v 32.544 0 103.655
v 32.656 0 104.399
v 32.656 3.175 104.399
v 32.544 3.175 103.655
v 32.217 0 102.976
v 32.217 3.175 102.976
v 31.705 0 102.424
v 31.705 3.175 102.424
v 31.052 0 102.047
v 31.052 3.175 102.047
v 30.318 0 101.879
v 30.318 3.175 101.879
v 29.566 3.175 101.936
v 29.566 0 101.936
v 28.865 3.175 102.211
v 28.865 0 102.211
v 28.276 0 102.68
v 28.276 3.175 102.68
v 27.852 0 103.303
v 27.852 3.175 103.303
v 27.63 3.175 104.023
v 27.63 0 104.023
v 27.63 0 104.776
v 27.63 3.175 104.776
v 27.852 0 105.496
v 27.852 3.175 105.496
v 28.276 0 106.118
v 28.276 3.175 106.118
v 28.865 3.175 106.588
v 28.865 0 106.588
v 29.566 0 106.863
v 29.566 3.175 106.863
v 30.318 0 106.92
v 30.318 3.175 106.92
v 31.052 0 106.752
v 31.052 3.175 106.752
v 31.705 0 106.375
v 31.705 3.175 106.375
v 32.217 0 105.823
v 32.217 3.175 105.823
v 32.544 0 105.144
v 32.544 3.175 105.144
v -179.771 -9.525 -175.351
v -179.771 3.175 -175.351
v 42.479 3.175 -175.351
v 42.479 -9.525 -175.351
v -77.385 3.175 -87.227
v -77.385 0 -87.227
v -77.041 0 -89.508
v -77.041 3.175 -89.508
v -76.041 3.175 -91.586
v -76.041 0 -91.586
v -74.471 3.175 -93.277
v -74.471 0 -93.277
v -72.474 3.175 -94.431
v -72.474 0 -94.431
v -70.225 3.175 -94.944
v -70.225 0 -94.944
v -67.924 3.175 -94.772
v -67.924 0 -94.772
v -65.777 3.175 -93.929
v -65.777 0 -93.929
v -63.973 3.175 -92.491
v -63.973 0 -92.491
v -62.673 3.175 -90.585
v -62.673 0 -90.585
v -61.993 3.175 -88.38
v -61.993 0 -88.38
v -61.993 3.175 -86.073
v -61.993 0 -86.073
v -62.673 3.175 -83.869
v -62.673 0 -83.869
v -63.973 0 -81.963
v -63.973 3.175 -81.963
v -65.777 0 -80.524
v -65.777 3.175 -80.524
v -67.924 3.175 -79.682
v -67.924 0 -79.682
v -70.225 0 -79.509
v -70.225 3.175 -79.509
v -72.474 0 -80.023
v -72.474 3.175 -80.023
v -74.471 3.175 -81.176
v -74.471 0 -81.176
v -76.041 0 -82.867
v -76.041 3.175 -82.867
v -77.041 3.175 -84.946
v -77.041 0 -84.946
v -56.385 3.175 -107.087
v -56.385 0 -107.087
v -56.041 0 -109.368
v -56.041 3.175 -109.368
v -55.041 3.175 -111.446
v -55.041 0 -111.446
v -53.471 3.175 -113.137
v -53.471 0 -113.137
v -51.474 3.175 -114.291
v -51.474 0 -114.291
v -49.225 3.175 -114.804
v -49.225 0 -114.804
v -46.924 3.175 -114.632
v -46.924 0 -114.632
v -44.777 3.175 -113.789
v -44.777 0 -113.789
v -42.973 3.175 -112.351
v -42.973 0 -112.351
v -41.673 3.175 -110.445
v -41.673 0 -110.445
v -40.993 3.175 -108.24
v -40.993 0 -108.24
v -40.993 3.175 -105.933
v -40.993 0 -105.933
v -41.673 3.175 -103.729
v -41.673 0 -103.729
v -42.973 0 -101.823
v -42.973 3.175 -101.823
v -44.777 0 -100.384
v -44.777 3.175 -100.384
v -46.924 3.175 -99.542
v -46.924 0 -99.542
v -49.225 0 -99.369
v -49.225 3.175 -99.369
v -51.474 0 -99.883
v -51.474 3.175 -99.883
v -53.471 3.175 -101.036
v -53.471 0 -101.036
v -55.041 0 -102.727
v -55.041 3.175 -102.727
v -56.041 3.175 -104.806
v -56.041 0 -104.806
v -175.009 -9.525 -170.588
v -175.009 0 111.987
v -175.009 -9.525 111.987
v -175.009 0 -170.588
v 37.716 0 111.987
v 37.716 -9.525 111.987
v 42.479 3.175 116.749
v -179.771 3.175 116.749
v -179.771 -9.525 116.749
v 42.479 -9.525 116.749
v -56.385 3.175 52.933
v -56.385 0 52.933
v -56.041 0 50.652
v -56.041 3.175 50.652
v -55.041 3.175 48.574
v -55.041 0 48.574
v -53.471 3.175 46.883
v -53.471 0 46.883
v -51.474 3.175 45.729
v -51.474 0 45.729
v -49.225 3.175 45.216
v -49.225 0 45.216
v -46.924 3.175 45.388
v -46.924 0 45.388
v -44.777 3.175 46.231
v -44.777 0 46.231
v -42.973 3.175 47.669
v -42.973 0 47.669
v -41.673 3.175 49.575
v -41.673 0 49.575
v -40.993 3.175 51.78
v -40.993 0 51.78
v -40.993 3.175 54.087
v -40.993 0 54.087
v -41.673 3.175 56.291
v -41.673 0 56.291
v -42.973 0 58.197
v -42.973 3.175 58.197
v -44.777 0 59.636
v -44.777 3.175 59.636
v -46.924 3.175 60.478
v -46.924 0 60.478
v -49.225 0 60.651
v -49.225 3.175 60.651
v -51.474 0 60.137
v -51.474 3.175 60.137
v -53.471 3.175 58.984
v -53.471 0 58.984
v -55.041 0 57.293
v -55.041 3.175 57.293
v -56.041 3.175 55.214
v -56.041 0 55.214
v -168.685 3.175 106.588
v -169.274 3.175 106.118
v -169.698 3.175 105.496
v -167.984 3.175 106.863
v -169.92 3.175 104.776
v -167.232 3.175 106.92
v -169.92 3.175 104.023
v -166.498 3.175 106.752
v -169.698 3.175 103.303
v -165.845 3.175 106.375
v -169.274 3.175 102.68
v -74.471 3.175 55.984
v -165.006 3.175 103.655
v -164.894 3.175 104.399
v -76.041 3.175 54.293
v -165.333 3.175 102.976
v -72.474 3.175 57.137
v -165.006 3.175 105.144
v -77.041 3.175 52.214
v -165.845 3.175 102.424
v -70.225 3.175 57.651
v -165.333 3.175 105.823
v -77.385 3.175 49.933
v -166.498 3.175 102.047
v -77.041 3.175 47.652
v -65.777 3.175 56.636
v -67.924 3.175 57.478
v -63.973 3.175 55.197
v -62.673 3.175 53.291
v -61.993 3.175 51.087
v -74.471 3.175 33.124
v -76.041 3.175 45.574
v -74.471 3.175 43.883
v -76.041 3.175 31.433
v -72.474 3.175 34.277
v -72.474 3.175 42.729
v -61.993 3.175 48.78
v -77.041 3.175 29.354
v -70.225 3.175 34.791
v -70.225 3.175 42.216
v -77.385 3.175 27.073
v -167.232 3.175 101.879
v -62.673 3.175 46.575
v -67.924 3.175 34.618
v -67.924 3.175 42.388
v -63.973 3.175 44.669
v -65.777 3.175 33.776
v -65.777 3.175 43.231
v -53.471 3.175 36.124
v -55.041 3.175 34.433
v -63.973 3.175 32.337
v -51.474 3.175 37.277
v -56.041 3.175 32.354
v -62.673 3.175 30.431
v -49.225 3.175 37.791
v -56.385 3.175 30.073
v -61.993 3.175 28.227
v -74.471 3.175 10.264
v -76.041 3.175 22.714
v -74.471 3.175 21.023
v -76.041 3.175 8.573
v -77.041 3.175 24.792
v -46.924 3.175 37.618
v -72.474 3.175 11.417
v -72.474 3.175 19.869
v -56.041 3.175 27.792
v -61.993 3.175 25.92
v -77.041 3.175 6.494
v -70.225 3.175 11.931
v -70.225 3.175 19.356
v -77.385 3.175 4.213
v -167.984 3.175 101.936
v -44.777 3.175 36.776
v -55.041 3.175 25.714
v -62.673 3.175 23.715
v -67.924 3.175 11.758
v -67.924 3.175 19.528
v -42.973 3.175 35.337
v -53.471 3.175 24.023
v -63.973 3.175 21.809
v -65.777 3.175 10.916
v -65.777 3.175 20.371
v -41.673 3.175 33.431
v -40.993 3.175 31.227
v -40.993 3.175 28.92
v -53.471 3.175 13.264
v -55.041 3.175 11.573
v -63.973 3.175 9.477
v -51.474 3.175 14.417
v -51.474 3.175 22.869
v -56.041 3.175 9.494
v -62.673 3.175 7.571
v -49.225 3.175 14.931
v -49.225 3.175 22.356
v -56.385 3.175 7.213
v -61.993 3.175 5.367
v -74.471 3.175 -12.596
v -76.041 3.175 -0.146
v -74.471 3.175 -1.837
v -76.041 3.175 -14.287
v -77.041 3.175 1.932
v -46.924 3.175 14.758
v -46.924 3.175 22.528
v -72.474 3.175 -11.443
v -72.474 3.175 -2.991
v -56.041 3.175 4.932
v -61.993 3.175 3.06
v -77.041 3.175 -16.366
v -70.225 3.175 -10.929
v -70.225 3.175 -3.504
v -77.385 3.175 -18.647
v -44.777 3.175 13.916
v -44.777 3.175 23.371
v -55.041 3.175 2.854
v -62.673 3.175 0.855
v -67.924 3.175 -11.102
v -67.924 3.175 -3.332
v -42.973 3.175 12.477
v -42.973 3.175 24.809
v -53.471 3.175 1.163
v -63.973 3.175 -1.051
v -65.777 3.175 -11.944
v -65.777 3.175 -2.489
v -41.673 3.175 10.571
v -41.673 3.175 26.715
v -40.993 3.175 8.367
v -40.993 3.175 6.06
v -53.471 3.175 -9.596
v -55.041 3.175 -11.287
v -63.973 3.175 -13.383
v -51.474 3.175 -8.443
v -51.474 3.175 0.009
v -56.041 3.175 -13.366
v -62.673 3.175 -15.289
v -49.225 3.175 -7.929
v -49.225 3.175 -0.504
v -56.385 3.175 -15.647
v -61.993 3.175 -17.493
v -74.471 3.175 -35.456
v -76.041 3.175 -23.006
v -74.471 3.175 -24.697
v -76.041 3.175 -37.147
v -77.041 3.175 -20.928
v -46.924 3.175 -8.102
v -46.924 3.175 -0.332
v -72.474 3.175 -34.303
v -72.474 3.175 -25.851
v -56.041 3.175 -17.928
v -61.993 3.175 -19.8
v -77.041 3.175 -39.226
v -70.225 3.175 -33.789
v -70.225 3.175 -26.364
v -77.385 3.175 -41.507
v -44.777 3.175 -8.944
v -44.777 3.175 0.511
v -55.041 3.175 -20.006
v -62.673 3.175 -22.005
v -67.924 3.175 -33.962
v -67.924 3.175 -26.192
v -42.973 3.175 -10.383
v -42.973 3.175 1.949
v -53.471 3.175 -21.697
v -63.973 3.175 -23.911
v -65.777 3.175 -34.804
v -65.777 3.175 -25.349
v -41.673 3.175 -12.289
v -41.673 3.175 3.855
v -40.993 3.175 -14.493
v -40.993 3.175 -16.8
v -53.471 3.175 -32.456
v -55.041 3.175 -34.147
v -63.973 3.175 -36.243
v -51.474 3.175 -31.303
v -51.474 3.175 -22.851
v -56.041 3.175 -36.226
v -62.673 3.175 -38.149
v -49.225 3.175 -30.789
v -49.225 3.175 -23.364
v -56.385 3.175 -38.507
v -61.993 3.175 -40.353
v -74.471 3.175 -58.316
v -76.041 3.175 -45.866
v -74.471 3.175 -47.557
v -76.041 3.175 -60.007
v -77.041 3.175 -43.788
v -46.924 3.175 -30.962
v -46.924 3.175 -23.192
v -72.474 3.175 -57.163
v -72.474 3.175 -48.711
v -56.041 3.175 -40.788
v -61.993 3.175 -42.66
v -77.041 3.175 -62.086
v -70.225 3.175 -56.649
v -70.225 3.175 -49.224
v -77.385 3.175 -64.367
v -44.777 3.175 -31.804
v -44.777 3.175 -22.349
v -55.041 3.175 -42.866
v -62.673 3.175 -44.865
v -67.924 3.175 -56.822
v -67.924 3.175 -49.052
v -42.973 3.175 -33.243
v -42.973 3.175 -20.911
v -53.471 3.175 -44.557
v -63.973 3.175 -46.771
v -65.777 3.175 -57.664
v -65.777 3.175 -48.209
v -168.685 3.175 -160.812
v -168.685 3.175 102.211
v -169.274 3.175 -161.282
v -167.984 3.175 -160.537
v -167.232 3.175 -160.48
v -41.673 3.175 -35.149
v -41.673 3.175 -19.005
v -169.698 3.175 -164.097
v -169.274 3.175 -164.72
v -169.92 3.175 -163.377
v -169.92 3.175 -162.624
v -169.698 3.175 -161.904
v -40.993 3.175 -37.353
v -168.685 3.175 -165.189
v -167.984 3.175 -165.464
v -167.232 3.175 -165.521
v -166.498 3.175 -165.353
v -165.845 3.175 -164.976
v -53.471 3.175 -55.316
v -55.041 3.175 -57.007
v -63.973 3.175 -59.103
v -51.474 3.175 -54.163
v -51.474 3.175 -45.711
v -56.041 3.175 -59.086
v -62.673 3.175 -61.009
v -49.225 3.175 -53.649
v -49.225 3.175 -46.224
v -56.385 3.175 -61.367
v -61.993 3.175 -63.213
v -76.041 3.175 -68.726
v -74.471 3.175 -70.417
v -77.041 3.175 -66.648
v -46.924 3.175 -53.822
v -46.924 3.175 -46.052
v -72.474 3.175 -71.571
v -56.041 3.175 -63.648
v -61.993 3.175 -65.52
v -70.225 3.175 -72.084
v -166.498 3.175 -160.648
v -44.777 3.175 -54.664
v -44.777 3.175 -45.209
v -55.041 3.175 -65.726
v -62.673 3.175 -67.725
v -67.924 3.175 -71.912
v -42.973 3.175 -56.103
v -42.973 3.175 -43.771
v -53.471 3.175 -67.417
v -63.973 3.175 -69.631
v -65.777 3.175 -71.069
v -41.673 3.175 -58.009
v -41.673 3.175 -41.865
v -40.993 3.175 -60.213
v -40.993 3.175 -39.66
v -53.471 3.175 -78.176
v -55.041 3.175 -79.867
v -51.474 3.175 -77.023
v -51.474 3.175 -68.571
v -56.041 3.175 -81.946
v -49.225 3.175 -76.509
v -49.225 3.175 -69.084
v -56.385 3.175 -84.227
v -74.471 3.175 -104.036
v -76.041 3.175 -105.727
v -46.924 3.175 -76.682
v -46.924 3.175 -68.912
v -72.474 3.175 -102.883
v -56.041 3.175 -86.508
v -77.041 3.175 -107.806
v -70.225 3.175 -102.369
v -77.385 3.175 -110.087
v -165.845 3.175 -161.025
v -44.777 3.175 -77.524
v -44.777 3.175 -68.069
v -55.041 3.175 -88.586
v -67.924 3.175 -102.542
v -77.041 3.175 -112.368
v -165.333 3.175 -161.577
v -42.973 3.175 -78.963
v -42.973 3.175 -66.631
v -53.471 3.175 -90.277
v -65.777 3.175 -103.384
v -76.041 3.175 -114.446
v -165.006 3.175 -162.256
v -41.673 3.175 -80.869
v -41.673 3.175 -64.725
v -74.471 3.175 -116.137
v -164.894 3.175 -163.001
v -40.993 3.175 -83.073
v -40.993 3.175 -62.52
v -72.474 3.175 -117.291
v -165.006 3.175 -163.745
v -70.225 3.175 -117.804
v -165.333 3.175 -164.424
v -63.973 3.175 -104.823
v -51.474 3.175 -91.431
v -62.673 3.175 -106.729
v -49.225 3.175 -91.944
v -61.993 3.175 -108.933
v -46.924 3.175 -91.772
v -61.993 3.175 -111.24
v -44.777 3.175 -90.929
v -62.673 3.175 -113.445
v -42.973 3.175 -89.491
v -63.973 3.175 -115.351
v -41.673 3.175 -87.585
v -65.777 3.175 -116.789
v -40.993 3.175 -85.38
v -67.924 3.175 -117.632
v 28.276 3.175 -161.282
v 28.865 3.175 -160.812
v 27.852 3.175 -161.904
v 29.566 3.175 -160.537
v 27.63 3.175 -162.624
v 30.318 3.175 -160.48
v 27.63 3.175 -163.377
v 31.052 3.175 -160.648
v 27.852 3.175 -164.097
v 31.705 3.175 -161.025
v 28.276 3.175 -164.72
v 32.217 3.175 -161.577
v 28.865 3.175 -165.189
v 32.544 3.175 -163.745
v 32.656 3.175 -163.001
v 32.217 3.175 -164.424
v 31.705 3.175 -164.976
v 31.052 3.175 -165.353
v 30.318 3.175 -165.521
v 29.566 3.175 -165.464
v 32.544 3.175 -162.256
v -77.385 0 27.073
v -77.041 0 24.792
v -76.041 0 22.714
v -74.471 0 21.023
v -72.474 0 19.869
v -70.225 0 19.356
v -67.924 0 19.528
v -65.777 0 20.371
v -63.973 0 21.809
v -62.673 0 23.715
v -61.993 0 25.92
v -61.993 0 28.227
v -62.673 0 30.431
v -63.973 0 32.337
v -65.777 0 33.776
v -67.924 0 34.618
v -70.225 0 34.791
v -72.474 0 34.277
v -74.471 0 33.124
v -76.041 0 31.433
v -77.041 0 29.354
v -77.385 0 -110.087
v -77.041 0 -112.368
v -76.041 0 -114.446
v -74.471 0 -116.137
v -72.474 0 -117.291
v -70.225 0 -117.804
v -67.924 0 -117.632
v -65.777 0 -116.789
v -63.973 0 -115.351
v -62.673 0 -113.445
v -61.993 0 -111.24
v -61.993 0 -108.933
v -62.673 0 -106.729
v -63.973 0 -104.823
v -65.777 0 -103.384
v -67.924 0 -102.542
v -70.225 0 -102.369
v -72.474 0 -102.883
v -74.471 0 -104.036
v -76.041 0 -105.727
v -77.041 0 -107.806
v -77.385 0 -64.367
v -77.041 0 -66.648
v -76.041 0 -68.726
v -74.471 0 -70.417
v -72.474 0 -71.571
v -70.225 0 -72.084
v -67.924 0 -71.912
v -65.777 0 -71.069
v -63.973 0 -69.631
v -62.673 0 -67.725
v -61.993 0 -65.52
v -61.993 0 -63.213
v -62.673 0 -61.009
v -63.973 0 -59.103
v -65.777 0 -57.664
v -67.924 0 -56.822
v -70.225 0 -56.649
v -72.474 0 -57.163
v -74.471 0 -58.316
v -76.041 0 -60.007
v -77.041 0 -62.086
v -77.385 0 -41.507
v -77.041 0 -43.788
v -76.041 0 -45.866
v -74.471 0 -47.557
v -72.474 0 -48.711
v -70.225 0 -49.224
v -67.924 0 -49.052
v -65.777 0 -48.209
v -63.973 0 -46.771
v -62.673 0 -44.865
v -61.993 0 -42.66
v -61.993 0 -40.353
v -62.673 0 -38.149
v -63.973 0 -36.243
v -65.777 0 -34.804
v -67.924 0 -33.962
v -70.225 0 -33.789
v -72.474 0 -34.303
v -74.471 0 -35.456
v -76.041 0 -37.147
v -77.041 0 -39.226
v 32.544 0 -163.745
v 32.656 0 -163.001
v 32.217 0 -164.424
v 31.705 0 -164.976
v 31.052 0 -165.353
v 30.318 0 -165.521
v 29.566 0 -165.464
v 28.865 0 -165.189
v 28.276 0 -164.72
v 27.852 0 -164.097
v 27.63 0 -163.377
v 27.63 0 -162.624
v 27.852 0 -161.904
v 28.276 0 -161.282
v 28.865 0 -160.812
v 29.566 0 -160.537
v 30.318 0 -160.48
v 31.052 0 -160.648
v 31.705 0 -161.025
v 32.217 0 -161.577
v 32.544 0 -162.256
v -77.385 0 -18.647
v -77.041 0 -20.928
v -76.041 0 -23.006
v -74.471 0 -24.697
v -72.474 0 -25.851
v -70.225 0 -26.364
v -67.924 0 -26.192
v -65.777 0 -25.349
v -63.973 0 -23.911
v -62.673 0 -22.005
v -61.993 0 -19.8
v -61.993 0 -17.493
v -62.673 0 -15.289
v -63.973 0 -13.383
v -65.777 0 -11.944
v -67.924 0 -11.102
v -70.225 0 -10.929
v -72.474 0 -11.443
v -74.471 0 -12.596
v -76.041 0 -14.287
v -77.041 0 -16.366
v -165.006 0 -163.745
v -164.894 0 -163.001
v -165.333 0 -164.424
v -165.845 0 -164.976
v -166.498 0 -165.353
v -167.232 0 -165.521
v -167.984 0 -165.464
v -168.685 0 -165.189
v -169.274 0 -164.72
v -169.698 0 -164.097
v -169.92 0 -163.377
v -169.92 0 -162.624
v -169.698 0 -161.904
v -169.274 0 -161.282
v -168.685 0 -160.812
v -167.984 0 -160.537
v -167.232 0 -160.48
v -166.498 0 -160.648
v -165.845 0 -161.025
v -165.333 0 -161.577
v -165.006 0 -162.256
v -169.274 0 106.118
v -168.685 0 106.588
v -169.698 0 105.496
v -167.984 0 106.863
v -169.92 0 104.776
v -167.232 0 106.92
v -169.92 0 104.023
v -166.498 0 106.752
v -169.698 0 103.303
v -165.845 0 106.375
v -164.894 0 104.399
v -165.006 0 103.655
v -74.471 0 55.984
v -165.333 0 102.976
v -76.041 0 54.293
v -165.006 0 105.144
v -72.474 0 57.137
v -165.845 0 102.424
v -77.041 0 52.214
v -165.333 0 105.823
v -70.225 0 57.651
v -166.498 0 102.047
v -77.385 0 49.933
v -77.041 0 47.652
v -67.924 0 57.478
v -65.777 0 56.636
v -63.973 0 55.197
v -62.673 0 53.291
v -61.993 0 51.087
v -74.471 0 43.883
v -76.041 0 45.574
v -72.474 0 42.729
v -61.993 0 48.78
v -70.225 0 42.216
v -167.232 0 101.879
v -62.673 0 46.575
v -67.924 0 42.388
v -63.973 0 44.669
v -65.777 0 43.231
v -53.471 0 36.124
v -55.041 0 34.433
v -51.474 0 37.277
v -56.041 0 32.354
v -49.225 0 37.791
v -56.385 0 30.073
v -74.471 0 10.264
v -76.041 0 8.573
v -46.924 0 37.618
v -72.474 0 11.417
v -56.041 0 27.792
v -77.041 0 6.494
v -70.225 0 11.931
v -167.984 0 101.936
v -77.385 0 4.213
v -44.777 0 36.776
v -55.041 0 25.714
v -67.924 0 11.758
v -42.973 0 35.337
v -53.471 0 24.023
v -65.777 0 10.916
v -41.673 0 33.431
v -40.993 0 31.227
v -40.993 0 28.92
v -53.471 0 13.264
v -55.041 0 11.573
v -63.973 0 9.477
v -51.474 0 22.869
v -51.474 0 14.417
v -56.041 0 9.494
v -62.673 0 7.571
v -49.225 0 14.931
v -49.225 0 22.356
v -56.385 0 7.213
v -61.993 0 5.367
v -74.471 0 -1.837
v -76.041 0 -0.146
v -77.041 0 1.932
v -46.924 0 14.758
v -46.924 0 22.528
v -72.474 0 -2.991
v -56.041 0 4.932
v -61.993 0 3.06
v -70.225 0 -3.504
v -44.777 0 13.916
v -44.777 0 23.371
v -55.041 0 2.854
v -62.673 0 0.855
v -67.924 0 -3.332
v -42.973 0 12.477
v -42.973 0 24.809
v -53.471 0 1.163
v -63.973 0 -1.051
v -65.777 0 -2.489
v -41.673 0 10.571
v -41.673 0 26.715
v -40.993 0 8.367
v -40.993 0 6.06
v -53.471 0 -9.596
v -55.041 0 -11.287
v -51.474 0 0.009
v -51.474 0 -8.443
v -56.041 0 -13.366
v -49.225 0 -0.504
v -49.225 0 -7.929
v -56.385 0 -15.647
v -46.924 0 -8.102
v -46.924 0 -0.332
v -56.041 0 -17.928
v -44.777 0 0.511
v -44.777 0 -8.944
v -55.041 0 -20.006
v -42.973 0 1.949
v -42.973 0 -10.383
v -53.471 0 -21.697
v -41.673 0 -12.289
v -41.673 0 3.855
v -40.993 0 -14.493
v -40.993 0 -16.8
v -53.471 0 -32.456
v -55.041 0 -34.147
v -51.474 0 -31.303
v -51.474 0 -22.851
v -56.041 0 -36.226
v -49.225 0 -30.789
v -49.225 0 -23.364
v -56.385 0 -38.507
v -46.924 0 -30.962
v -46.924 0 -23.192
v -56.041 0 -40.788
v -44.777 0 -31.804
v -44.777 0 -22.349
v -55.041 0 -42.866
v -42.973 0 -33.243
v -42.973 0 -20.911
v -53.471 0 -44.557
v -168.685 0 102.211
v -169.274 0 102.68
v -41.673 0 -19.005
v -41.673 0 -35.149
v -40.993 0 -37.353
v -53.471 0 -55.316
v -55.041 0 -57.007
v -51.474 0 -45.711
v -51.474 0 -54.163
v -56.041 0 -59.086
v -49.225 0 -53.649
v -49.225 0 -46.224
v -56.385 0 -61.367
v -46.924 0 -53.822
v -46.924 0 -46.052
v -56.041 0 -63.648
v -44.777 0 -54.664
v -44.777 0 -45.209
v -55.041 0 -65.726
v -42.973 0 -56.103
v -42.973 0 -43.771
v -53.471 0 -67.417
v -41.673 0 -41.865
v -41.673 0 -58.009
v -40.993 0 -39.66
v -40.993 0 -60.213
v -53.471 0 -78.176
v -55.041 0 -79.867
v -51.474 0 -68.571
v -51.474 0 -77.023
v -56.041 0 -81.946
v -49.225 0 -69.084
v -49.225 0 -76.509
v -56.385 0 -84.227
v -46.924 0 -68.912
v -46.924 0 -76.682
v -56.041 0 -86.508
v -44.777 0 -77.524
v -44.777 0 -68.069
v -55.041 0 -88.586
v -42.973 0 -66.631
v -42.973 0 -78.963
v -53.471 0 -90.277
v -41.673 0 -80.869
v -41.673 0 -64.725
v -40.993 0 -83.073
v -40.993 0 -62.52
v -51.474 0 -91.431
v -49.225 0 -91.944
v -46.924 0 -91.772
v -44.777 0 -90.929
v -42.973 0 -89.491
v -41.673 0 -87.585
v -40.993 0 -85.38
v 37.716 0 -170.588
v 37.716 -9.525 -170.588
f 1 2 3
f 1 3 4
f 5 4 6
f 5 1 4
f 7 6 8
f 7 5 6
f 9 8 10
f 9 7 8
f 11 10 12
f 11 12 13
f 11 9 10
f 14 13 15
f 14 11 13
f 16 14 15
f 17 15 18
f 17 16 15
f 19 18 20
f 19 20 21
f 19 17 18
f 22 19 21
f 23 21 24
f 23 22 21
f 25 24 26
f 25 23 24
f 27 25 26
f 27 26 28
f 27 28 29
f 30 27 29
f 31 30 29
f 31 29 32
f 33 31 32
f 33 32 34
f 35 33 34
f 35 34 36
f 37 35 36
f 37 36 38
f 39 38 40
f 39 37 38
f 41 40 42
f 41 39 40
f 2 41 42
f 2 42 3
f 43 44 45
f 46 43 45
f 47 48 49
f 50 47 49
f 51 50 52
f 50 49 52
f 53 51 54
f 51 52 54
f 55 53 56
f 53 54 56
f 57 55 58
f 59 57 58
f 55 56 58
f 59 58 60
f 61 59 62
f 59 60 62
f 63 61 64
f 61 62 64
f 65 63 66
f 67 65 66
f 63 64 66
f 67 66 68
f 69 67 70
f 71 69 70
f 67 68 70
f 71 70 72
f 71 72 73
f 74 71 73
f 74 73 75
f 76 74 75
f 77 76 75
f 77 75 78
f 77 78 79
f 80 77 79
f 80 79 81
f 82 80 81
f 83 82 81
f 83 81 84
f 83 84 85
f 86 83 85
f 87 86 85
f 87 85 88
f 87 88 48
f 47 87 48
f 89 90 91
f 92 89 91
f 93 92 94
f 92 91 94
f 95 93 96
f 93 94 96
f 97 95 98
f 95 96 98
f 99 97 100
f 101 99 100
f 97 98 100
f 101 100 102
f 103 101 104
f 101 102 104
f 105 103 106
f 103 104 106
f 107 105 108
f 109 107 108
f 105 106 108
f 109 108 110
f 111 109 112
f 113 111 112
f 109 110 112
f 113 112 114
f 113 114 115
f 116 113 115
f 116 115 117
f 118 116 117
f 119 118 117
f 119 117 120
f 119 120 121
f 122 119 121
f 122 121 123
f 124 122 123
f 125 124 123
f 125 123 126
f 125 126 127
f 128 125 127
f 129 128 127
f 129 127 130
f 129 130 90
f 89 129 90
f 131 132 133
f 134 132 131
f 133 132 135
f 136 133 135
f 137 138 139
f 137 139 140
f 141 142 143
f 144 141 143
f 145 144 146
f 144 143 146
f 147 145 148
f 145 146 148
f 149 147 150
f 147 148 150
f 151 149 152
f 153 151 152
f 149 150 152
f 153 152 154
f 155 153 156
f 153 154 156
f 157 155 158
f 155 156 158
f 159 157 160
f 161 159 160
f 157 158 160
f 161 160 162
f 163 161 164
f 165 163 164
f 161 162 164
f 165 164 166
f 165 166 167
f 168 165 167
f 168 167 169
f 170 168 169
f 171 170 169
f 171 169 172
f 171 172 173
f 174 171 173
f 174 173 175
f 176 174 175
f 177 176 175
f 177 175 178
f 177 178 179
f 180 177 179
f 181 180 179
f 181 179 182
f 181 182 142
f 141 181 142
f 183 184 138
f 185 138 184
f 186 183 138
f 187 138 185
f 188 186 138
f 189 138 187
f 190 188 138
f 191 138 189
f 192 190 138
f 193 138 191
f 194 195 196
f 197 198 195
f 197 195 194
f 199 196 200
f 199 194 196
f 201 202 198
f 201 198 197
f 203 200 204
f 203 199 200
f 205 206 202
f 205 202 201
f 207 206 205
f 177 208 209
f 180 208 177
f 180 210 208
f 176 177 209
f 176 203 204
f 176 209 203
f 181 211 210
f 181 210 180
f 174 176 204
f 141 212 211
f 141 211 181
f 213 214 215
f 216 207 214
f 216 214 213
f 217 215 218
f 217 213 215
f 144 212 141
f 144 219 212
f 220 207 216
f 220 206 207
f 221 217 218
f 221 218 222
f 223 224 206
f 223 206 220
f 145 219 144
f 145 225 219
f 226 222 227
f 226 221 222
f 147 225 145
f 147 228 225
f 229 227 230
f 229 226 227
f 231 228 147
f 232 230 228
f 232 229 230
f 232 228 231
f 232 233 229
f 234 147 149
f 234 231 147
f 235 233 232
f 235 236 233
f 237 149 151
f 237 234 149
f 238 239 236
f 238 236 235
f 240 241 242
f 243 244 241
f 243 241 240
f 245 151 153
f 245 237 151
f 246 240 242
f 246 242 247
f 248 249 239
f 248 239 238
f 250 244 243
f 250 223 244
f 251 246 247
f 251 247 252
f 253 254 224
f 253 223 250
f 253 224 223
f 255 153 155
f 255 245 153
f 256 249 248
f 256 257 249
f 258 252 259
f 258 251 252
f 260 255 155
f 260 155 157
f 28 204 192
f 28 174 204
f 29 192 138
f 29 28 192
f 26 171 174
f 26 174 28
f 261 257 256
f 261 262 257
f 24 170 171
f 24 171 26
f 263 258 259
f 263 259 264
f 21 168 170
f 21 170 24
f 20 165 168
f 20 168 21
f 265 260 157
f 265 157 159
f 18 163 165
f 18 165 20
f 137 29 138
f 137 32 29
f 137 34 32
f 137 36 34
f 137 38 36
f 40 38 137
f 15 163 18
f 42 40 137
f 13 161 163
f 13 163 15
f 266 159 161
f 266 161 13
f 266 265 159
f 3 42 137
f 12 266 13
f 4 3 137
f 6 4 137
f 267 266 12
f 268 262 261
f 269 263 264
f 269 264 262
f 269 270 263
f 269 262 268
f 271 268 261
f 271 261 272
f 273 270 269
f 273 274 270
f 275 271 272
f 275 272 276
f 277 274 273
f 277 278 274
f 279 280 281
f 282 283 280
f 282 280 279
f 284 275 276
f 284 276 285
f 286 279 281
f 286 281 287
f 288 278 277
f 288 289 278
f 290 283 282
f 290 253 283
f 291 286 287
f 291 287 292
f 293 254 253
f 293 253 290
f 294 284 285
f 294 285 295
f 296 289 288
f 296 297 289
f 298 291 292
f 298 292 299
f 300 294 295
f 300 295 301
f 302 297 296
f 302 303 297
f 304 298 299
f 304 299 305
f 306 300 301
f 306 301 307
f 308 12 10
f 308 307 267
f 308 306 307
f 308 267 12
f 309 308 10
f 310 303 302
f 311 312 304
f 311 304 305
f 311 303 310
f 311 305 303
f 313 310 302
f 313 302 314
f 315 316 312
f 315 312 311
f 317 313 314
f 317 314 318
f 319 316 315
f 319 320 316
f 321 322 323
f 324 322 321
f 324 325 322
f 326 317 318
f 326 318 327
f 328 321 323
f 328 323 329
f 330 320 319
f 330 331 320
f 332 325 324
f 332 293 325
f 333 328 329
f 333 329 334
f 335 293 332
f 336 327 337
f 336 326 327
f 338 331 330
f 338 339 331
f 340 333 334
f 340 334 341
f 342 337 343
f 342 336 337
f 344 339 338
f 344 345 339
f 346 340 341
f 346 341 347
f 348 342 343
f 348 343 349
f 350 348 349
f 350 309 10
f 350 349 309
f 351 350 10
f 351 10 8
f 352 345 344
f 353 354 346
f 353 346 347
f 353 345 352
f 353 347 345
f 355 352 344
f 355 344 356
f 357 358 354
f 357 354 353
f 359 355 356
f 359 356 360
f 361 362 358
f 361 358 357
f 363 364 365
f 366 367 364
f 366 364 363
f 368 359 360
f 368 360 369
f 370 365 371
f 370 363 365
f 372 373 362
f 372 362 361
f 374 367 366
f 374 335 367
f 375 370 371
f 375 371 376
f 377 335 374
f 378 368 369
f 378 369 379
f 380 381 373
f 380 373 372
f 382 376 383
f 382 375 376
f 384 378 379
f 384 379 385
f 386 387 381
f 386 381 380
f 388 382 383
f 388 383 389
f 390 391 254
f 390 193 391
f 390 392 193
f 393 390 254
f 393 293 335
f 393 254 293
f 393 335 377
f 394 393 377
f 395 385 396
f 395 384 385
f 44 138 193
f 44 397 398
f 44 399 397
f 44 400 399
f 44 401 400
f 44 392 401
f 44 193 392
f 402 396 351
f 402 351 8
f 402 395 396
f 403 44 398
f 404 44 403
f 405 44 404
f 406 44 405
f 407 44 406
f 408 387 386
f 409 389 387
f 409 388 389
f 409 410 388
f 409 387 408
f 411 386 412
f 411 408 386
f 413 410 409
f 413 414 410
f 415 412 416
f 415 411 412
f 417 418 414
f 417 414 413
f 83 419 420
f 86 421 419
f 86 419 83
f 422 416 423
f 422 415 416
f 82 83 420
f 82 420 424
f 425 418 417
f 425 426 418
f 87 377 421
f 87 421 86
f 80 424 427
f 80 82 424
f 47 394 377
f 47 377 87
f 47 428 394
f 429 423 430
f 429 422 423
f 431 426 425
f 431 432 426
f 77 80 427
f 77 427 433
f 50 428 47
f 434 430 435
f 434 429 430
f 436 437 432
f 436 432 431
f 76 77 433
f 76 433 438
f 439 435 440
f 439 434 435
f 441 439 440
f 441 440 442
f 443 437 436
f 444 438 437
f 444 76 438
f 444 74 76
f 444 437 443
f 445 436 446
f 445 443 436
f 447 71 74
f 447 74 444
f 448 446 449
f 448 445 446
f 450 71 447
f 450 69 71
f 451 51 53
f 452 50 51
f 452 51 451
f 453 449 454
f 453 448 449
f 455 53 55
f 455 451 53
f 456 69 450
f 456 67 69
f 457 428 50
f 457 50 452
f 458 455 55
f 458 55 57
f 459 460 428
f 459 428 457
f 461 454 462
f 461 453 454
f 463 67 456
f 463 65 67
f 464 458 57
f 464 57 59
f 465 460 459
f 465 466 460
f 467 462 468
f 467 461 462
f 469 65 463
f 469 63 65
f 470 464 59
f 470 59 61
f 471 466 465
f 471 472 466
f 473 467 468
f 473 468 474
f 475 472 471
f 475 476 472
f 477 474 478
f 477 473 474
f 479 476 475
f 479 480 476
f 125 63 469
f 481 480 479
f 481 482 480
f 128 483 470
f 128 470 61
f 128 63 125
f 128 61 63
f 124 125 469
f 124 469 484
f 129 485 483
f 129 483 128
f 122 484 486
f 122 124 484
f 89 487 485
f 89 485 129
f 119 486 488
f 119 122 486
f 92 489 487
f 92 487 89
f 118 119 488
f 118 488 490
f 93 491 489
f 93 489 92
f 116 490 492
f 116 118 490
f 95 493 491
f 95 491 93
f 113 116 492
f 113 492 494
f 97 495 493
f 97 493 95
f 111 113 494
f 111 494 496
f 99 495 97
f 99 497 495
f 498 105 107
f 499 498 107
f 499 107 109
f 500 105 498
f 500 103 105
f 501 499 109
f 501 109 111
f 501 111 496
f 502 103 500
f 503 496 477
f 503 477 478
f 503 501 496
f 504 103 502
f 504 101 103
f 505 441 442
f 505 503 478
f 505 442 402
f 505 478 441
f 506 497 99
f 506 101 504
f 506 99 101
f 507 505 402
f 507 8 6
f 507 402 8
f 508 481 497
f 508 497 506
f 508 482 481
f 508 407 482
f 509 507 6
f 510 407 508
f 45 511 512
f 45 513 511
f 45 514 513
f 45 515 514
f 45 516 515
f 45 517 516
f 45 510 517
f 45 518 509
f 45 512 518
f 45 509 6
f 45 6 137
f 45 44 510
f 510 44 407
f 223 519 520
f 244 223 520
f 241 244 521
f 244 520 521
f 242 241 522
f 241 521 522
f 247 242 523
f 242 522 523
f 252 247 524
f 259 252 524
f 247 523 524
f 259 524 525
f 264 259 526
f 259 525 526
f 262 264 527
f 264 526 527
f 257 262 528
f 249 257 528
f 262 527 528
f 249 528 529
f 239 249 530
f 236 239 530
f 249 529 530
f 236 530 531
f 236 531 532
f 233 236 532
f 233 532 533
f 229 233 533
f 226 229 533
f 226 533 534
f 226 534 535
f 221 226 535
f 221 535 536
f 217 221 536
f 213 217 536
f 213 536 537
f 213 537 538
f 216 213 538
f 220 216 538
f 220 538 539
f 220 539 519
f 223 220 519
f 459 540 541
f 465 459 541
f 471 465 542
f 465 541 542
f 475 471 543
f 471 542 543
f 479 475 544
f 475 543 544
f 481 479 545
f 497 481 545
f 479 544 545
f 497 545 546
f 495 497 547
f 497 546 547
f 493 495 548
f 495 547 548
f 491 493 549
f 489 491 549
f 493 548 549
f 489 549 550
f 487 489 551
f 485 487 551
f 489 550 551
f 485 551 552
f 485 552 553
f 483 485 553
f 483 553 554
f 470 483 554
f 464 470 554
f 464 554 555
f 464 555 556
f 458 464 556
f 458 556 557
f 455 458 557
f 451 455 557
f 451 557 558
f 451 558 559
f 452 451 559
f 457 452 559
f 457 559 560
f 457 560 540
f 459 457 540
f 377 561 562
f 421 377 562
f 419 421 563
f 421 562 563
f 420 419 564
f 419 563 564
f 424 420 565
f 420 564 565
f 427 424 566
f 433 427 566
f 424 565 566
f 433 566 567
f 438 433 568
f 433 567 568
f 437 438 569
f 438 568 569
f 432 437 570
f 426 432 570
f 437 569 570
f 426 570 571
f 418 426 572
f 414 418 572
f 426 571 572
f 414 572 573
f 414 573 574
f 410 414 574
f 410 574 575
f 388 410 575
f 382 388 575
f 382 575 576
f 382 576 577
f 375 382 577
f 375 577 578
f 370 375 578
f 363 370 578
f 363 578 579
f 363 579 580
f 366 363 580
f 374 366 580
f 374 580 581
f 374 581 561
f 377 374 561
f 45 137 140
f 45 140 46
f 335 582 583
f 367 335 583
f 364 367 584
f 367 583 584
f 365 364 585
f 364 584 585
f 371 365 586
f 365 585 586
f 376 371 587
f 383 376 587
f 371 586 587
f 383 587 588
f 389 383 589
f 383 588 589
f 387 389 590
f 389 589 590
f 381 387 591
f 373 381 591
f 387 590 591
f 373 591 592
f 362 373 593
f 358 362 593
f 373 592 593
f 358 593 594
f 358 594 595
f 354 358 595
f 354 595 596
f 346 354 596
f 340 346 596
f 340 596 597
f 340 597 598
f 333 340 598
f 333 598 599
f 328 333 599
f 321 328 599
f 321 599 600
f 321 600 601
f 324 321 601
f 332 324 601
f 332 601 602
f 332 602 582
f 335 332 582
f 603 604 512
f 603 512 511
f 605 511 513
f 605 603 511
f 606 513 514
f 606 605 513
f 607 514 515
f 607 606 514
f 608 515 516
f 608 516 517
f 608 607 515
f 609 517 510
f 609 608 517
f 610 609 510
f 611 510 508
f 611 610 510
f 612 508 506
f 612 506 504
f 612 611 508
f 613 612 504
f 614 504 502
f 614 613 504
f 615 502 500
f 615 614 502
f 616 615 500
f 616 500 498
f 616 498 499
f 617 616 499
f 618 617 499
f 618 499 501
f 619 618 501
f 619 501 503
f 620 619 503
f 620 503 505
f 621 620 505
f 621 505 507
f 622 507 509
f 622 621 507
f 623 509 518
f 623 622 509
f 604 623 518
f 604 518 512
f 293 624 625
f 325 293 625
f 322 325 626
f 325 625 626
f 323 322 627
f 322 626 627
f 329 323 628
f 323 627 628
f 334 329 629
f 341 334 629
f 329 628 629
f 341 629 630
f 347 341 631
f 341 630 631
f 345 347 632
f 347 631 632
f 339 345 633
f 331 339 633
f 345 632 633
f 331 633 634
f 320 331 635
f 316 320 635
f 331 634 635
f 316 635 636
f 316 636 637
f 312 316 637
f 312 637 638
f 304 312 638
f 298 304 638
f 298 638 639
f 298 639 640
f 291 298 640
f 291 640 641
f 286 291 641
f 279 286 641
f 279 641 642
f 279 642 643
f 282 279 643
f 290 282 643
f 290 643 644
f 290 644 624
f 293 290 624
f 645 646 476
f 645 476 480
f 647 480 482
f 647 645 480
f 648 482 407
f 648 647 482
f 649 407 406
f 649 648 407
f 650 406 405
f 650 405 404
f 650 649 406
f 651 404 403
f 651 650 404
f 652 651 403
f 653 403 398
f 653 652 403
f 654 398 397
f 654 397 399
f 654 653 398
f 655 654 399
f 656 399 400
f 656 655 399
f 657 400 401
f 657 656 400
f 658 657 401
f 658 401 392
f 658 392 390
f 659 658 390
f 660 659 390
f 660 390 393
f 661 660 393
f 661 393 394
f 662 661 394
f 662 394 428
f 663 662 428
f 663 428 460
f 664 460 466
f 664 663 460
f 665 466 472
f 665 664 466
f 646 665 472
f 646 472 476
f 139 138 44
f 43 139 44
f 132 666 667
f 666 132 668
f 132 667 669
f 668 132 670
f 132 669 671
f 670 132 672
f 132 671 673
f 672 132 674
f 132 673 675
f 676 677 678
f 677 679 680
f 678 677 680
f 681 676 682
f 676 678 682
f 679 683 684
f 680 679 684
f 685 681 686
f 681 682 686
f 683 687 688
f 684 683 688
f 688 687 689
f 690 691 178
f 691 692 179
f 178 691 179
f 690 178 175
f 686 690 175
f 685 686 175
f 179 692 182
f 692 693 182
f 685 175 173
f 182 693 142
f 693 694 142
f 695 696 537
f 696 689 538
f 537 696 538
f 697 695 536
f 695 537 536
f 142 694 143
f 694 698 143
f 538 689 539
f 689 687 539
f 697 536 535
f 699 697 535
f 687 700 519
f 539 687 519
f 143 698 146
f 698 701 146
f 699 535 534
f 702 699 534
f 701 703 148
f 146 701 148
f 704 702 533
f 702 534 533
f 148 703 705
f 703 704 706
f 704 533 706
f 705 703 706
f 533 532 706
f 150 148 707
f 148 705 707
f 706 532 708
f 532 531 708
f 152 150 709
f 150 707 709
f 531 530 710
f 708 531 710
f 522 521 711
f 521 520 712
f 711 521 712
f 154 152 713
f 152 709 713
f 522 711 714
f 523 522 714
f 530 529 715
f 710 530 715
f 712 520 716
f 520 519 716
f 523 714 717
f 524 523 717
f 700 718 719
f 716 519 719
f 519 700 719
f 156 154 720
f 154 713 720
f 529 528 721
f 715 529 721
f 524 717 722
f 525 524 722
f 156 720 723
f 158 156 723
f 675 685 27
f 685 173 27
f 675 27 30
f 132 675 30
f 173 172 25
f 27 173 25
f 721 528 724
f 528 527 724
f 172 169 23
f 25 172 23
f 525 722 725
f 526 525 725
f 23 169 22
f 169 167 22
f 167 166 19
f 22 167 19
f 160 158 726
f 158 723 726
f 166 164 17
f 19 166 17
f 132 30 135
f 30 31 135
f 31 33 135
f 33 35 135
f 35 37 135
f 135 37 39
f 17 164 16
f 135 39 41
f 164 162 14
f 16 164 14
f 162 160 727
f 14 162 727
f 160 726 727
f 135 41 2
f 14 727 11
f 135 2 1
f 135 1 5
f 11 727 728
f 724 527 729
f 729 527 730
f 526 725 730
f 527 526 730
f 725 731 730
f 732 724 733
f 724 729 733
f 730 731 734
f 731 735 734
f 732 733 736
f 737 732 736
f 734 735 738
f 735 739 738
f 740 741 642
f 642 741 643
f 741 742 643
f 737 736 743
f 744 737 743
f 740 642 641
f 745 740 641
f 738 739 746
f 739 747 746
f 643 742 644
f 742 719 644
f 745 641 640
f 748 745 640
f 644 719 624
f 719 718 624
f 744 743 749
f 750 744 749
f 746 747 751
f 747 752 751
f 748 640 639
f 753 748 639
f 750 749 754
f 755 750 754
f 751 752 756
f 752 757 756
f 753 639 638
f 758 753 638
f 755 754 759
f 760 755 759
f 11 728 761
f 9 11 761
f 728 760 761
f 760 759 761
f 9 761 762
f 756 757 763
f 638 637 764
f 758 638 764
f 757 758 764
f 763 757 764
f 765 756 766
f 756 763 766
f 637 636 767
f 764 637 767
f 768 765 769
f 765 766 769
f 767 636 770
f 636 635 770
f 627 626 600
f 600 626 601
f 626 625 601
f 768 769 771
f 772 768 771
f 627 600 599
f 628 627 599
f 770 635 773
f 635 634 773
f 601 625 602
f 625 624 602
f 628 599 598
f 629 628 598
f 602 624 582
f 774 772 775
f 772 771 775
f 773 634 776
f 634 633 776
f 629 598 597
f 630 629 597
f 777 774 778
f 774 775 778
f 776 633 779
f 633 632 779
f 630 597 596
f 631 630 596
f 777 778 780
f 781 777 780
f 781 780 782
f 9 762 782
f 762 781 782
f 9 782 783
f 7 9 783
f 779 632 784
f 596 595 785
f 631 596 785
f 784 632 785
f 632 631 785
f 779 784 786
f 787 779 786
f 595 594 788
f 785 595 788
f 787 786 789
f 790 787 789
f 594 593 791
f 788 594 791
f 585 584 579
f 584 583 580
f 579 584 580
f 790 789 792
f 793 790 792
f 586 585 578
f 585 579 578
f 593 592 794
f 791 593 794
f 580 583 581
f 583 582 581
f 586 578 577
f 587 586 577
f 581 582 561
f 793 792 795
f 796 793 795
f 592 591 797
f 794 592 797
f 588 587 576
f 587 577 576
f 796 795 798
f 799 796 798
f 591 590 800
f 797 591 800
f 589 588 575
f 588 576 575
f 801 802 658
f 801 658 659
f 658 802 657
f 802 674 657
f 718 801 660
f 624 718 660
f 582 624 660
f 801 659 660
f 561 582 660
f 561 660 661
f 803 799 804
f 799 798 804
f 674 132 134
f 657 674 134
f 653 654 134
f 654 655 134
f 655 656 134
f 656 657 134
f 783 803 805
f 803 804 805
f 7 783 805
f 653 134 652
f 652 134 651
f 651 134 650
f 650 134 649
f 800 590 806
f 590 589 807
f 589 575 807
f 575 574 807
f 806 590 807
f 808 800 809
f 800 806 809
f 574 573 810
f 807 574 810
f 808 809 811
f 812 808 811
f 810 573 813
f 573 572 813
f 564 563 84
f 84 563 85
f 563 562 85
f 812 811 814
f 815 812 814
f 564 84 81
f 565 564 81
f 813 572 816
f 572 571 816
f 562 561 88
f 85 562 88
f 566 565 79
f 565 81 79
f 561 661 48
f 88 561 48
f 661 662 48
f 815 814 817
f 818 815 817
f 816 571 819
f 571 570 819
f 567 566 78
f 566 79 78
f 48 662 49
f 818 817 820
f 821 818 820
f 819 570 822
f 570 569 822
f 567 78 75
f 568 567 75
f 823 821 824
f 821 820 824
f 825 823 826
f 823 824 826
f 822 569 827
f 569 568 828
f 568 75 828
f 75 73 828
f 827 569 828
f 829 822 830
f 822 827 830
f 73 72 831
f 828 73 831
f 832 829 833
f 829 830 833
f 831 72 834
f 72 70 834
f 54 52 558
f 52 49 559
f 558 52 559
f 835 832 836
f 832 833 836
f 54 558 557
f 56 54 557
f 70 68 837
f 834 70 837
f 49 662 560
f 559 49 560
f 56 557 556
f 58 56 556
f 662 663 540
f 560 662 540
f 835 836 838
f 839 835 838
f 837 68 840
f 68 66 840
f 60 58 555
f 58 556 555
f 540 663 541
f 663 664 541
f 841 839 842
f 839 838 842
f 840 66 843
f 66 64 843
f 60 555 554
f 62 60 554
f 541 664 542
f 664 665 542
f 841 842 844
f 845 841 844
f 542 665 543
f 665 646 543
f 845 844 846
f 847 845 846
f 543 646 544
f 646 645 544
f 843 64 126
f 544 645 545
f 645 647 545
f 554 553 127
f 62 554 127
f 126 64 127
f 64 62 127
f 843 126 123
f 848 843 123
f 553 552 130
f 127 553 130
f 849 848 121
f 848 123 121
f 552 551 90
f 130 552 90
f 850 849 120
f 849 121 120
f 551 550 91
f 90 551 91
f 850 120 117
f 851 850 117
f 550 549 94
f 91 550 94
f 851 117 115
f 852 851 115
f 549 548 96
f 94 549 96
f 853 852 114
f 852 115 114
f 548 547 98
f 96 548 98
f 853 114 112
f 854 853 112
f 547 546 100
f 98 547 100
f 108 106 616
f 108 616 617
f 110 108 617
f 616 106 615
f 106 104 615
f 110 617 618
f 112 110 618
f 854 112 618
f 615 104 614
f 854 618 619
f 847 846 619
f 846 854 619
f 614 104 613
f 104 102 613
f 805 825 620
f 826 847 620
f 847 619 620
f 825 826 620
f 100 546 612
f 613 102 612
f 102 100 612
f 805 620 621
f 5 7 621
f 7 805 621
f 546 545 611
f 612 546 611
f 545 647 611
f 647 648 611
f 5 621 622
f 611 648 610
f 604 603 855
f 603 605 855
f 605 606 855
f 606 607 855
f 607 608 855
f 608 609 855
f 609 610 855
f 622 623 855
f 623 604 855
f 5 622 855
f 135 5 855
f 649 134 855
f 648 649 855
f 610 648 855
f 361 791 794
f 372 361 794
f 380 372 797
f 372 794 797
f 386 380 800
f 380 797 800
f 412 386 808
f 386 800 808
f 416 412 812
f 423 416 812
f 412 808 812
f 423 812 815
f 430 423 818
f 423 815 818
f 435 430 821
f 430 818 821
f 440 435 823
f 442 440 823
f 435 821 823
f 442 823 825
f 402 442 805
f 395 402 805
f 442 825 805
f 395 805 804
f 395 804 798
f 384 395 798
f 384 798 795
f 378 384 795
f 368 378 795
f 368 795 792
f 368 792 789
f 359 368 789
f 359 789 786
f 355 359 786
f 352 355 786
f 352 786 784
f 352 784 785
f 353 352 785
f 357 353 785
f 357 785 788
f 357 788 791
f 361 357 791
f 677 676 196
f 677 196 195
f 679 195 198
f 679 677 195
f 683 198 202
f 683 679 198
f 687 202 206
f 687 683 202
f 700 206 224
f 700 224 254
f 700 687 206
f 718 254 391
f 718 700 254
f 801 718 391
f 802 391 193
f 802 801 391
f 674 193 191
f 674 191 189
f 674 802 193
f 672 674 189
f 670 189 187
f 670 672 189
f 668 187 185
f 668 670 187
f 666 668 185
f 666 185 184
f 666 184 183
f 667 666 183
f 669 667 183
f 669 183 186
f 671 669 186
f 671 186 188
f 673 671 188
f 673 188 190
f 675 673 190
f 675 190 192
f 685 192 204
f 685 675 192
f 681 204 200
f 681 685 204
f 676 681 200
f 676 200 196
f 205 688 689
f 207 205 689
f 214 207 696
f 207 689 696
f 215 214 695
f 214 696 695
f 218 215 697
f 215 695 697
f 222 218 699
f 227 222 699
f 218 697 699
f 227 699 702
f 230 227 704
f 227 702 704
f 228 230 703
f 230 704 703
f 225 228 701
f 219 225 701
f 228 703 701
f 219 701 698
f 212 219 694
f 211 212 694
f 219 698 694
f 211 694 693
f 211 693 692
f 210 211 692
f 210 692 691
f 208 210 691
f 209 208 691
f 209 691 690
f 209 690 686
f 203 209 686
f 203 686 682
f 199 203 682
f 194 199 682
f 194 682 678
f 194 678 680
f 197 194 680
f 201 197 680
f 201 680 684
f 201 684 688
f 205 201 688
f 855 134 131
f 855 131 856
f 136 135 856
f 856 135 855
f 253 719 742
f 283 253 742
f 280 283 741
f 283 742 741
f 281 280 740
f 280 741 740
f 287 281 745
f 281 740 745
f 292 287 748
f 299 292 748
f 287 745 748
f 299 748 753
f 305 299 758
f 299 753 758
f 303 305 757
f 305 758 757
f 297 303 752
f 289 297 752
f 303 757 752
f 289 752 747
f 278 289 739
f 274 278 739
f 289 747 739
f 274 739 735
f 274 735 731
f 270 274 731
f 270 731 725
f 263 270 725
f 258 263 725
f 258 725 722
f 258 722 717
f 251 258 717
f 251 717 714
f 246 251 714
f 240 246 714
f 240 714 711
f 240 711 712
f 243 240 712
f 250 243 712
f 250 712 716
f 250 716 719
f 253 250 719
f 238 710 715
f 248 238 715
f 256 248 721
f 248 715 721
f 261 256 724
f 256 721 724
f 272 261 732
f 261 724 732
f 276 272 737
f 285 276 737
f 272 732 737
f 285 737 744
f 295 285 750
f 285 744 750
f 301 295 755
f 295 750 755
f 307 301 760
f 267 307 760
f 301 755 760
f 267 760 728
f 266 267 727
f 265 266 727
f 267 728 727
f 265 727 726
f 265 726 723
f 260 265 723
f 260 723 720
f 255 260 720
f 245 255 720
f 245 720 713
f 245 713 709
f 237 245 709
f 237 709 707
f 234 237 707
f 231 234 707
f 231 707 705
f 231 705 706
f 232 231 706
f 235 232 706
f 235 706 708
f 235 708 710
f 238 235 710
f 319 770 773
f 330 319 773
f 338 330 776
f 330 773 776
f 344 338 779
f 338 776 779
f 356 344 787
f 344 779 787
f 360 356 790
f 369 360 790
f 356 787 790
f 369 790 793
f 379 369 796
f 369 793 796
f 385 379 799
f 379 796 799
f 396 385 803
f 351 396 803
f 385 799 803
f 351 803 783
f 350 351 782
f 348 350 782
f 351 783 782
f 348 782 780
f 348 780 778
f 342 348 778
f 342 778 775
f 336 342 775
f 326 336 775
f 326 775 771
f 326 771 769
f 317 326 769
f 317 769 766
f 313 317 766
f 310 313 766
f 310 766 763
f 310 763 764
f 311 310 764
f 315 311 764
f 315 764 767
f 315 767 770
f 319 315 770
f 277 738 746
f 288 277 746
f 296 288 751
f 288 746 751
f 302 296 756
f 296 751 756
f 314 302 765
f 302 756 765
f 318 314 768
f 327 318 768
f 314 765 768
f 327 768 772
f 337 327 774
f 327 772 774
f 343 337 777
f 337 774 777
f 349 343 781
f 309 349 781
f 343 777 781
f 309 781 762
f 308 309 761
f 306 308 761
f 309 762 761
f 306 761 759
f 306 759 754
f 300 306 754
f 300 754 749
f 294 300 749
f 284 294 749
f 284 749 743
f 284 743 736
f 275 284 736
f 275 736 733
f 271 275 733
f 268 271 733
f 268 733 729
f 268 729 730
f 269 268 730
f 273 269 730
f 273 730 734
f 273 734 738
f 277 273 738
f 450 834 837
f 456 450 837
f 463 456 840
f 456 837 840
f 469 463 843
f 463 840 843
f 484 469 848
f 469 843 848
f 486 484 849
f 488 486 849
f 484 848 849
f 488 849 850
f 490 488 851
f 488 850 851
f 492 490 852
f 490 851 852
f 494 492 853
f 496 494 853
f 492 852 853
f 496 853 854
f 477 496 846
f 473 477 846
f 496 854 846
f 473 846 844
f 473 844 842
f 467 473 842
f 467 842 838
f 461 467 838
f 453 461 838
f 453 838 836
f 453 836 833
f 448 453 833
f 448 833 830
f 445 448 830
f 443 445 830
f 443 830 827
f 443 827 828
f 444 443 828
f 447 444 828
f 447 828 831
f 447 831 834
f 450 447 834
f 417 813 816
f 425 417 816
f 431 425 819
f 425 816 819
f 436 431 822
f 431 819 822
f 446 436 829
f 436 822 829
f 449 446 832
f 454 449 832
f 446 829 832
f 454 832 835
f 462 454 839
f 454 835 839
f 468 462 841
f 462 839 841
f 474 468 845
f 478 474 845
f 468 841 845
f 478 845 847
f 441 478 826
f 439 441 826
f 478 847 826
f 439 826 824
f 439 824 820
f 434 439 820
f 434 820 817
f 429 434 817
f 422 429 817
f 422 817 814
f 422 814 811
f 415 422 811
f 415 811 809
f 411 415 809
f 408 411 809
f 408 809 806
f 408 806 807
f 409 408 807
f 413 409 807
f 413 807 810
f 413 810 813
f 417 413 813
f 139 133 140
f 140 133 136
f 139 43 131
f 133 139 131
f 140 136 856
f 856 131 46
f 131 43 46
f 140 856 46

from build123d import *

# Parameters (mm, degrees)
SKETCH1_W                        = 209.55
SKETCH1_H                        = 279.399995444
SKETCH1_R                        = 2.5273
BOSS_EXTRUDE1_DEPTH              = 3.175
SKETCH2_W                        = 222.25
SKETCH2_H                        = 292.099995444
SKETCH2_W_2                      = 212.725
SKETCH2_H_2                      = 282.574995444
BOSS_EXTRUDE2_DEPTH              = 12.7
SKETCH2_2_W                      = 212.725
SKETCH2_2_H                      = 282.574995444
SKETCH2_2_W_2                    = 209.55
SKETCH2_2_H_2                    = 279.399995444
BOSS_EXTRUDE3_DEPTH              = 3.175
F_39_64_0_60938_DIAMETER_HOLE1_D = 15.478252


with BuildPart() as part:
    # Sketch1 → Boss-Extrude1 (new body)
    with BuildSketch(Plane(origin=(0, 0, 0), x_dir=(1, 0, 0), z_dir=(0, 1, 0))):
        with Locations((-68.646181354, 29.300553278)):
            Rectangle(SKETCH1_W, SKETCH1_H)
        with Locations((-167.421181354, -104.399444444)):
            Circle(SKETCH1_R, mode=Mode.SUBTRACT)
        with Locations((-167.421181354, 163.000555634)):
            Circle(SKETCH1_R, mode=Mode.SUBTRACT)
        with Locations((30.128818646, -104.399444444)):
            Circle(SKETCH1_R, mode=Mode.SUBTRACT)
        with Locations((30.128818646, 163.000555634)):
            Circle(SKETCH1_R, mode=Mode.SUBTRACT)
    extrude(amount=BOSS_EXTRUDE1_DEPTH)



with BuildPart() as body_2:
    # Sketch2 → Boss-Extrude2 (new body)
    with BuildSketch(Plane(origin=(0, 3.175, 0), x_dir=(1, 0, 0), z_dir=(0, 1, 0))):
        with Locations((-68.646181354, 29.300553278)):
            Rectangle(SKETCH2_W, SKETCH2_H)
        with Locations((-68.646181354, 29.300553278)):
            Rectangle(SKETCH2_W_2, SKETCH2_H_2, mode=Mode.SUBTRACT)
    extrude(amount=-BOSS_EXTRUDE2_DEPTH)


with BuildPart() as part_1:
    add(part.part)

    add(body_2.part)  # Boss-Extrude3 merges body 2
    # Sketch2<2> → Boss-Extrude3 (add)
    with BuildSketch(Plane(origin=(0, 3.175, 0), x_dir=(1, 0, 0), z_dir=(0, 1, 0))):
        with Locations((-68.646181354, 29.300553278)):
            Rectangle(SKETCH2_2_W, SKETCH2_2_H)
        with Locations((-68.646181354, 29.300553278)):
            Rectangle(SKETCH2_2_W_2, SKETCH2_2_H_2, mode=Mode.SUBTRACT)
    extrude(amount=-BOSS_EXTRUDE3_DEPTH)

    # 39/64 (0.60938) Diameter Hole1 (through all)
    with Locations(Plane(origin=(0, 3.175, 0), x_dir=(1, 0, 0), z_dir=(0, 1, 0))):
        with Locations((-69.646181393, 110.086655576), (-48.646181397, 107.086655551), (-69.64618139, 87.226655576), (-48.646181393, 84.226655551), (-48.64618139, 61.366655551), (-69.646181387, 64.366655576), (-69.646181383, 41.506655576), (-48.646181387, 38.506655551), (-48.646181384, 15.646655551), (-69.64618138, 18.646655576), (-69.646181377, -4.213344424), (-48.646181381, -7.213344449), (-48.646181377, -30.073344449), (-69.646181374, -27.073344424), (-69.646181371, -49.933344424), (-48.646181374, -52.933344449)):
            Hole(F_39_64_0_60938_DIAMETER_HOLE1_D / 2)


solid = part_1.part
